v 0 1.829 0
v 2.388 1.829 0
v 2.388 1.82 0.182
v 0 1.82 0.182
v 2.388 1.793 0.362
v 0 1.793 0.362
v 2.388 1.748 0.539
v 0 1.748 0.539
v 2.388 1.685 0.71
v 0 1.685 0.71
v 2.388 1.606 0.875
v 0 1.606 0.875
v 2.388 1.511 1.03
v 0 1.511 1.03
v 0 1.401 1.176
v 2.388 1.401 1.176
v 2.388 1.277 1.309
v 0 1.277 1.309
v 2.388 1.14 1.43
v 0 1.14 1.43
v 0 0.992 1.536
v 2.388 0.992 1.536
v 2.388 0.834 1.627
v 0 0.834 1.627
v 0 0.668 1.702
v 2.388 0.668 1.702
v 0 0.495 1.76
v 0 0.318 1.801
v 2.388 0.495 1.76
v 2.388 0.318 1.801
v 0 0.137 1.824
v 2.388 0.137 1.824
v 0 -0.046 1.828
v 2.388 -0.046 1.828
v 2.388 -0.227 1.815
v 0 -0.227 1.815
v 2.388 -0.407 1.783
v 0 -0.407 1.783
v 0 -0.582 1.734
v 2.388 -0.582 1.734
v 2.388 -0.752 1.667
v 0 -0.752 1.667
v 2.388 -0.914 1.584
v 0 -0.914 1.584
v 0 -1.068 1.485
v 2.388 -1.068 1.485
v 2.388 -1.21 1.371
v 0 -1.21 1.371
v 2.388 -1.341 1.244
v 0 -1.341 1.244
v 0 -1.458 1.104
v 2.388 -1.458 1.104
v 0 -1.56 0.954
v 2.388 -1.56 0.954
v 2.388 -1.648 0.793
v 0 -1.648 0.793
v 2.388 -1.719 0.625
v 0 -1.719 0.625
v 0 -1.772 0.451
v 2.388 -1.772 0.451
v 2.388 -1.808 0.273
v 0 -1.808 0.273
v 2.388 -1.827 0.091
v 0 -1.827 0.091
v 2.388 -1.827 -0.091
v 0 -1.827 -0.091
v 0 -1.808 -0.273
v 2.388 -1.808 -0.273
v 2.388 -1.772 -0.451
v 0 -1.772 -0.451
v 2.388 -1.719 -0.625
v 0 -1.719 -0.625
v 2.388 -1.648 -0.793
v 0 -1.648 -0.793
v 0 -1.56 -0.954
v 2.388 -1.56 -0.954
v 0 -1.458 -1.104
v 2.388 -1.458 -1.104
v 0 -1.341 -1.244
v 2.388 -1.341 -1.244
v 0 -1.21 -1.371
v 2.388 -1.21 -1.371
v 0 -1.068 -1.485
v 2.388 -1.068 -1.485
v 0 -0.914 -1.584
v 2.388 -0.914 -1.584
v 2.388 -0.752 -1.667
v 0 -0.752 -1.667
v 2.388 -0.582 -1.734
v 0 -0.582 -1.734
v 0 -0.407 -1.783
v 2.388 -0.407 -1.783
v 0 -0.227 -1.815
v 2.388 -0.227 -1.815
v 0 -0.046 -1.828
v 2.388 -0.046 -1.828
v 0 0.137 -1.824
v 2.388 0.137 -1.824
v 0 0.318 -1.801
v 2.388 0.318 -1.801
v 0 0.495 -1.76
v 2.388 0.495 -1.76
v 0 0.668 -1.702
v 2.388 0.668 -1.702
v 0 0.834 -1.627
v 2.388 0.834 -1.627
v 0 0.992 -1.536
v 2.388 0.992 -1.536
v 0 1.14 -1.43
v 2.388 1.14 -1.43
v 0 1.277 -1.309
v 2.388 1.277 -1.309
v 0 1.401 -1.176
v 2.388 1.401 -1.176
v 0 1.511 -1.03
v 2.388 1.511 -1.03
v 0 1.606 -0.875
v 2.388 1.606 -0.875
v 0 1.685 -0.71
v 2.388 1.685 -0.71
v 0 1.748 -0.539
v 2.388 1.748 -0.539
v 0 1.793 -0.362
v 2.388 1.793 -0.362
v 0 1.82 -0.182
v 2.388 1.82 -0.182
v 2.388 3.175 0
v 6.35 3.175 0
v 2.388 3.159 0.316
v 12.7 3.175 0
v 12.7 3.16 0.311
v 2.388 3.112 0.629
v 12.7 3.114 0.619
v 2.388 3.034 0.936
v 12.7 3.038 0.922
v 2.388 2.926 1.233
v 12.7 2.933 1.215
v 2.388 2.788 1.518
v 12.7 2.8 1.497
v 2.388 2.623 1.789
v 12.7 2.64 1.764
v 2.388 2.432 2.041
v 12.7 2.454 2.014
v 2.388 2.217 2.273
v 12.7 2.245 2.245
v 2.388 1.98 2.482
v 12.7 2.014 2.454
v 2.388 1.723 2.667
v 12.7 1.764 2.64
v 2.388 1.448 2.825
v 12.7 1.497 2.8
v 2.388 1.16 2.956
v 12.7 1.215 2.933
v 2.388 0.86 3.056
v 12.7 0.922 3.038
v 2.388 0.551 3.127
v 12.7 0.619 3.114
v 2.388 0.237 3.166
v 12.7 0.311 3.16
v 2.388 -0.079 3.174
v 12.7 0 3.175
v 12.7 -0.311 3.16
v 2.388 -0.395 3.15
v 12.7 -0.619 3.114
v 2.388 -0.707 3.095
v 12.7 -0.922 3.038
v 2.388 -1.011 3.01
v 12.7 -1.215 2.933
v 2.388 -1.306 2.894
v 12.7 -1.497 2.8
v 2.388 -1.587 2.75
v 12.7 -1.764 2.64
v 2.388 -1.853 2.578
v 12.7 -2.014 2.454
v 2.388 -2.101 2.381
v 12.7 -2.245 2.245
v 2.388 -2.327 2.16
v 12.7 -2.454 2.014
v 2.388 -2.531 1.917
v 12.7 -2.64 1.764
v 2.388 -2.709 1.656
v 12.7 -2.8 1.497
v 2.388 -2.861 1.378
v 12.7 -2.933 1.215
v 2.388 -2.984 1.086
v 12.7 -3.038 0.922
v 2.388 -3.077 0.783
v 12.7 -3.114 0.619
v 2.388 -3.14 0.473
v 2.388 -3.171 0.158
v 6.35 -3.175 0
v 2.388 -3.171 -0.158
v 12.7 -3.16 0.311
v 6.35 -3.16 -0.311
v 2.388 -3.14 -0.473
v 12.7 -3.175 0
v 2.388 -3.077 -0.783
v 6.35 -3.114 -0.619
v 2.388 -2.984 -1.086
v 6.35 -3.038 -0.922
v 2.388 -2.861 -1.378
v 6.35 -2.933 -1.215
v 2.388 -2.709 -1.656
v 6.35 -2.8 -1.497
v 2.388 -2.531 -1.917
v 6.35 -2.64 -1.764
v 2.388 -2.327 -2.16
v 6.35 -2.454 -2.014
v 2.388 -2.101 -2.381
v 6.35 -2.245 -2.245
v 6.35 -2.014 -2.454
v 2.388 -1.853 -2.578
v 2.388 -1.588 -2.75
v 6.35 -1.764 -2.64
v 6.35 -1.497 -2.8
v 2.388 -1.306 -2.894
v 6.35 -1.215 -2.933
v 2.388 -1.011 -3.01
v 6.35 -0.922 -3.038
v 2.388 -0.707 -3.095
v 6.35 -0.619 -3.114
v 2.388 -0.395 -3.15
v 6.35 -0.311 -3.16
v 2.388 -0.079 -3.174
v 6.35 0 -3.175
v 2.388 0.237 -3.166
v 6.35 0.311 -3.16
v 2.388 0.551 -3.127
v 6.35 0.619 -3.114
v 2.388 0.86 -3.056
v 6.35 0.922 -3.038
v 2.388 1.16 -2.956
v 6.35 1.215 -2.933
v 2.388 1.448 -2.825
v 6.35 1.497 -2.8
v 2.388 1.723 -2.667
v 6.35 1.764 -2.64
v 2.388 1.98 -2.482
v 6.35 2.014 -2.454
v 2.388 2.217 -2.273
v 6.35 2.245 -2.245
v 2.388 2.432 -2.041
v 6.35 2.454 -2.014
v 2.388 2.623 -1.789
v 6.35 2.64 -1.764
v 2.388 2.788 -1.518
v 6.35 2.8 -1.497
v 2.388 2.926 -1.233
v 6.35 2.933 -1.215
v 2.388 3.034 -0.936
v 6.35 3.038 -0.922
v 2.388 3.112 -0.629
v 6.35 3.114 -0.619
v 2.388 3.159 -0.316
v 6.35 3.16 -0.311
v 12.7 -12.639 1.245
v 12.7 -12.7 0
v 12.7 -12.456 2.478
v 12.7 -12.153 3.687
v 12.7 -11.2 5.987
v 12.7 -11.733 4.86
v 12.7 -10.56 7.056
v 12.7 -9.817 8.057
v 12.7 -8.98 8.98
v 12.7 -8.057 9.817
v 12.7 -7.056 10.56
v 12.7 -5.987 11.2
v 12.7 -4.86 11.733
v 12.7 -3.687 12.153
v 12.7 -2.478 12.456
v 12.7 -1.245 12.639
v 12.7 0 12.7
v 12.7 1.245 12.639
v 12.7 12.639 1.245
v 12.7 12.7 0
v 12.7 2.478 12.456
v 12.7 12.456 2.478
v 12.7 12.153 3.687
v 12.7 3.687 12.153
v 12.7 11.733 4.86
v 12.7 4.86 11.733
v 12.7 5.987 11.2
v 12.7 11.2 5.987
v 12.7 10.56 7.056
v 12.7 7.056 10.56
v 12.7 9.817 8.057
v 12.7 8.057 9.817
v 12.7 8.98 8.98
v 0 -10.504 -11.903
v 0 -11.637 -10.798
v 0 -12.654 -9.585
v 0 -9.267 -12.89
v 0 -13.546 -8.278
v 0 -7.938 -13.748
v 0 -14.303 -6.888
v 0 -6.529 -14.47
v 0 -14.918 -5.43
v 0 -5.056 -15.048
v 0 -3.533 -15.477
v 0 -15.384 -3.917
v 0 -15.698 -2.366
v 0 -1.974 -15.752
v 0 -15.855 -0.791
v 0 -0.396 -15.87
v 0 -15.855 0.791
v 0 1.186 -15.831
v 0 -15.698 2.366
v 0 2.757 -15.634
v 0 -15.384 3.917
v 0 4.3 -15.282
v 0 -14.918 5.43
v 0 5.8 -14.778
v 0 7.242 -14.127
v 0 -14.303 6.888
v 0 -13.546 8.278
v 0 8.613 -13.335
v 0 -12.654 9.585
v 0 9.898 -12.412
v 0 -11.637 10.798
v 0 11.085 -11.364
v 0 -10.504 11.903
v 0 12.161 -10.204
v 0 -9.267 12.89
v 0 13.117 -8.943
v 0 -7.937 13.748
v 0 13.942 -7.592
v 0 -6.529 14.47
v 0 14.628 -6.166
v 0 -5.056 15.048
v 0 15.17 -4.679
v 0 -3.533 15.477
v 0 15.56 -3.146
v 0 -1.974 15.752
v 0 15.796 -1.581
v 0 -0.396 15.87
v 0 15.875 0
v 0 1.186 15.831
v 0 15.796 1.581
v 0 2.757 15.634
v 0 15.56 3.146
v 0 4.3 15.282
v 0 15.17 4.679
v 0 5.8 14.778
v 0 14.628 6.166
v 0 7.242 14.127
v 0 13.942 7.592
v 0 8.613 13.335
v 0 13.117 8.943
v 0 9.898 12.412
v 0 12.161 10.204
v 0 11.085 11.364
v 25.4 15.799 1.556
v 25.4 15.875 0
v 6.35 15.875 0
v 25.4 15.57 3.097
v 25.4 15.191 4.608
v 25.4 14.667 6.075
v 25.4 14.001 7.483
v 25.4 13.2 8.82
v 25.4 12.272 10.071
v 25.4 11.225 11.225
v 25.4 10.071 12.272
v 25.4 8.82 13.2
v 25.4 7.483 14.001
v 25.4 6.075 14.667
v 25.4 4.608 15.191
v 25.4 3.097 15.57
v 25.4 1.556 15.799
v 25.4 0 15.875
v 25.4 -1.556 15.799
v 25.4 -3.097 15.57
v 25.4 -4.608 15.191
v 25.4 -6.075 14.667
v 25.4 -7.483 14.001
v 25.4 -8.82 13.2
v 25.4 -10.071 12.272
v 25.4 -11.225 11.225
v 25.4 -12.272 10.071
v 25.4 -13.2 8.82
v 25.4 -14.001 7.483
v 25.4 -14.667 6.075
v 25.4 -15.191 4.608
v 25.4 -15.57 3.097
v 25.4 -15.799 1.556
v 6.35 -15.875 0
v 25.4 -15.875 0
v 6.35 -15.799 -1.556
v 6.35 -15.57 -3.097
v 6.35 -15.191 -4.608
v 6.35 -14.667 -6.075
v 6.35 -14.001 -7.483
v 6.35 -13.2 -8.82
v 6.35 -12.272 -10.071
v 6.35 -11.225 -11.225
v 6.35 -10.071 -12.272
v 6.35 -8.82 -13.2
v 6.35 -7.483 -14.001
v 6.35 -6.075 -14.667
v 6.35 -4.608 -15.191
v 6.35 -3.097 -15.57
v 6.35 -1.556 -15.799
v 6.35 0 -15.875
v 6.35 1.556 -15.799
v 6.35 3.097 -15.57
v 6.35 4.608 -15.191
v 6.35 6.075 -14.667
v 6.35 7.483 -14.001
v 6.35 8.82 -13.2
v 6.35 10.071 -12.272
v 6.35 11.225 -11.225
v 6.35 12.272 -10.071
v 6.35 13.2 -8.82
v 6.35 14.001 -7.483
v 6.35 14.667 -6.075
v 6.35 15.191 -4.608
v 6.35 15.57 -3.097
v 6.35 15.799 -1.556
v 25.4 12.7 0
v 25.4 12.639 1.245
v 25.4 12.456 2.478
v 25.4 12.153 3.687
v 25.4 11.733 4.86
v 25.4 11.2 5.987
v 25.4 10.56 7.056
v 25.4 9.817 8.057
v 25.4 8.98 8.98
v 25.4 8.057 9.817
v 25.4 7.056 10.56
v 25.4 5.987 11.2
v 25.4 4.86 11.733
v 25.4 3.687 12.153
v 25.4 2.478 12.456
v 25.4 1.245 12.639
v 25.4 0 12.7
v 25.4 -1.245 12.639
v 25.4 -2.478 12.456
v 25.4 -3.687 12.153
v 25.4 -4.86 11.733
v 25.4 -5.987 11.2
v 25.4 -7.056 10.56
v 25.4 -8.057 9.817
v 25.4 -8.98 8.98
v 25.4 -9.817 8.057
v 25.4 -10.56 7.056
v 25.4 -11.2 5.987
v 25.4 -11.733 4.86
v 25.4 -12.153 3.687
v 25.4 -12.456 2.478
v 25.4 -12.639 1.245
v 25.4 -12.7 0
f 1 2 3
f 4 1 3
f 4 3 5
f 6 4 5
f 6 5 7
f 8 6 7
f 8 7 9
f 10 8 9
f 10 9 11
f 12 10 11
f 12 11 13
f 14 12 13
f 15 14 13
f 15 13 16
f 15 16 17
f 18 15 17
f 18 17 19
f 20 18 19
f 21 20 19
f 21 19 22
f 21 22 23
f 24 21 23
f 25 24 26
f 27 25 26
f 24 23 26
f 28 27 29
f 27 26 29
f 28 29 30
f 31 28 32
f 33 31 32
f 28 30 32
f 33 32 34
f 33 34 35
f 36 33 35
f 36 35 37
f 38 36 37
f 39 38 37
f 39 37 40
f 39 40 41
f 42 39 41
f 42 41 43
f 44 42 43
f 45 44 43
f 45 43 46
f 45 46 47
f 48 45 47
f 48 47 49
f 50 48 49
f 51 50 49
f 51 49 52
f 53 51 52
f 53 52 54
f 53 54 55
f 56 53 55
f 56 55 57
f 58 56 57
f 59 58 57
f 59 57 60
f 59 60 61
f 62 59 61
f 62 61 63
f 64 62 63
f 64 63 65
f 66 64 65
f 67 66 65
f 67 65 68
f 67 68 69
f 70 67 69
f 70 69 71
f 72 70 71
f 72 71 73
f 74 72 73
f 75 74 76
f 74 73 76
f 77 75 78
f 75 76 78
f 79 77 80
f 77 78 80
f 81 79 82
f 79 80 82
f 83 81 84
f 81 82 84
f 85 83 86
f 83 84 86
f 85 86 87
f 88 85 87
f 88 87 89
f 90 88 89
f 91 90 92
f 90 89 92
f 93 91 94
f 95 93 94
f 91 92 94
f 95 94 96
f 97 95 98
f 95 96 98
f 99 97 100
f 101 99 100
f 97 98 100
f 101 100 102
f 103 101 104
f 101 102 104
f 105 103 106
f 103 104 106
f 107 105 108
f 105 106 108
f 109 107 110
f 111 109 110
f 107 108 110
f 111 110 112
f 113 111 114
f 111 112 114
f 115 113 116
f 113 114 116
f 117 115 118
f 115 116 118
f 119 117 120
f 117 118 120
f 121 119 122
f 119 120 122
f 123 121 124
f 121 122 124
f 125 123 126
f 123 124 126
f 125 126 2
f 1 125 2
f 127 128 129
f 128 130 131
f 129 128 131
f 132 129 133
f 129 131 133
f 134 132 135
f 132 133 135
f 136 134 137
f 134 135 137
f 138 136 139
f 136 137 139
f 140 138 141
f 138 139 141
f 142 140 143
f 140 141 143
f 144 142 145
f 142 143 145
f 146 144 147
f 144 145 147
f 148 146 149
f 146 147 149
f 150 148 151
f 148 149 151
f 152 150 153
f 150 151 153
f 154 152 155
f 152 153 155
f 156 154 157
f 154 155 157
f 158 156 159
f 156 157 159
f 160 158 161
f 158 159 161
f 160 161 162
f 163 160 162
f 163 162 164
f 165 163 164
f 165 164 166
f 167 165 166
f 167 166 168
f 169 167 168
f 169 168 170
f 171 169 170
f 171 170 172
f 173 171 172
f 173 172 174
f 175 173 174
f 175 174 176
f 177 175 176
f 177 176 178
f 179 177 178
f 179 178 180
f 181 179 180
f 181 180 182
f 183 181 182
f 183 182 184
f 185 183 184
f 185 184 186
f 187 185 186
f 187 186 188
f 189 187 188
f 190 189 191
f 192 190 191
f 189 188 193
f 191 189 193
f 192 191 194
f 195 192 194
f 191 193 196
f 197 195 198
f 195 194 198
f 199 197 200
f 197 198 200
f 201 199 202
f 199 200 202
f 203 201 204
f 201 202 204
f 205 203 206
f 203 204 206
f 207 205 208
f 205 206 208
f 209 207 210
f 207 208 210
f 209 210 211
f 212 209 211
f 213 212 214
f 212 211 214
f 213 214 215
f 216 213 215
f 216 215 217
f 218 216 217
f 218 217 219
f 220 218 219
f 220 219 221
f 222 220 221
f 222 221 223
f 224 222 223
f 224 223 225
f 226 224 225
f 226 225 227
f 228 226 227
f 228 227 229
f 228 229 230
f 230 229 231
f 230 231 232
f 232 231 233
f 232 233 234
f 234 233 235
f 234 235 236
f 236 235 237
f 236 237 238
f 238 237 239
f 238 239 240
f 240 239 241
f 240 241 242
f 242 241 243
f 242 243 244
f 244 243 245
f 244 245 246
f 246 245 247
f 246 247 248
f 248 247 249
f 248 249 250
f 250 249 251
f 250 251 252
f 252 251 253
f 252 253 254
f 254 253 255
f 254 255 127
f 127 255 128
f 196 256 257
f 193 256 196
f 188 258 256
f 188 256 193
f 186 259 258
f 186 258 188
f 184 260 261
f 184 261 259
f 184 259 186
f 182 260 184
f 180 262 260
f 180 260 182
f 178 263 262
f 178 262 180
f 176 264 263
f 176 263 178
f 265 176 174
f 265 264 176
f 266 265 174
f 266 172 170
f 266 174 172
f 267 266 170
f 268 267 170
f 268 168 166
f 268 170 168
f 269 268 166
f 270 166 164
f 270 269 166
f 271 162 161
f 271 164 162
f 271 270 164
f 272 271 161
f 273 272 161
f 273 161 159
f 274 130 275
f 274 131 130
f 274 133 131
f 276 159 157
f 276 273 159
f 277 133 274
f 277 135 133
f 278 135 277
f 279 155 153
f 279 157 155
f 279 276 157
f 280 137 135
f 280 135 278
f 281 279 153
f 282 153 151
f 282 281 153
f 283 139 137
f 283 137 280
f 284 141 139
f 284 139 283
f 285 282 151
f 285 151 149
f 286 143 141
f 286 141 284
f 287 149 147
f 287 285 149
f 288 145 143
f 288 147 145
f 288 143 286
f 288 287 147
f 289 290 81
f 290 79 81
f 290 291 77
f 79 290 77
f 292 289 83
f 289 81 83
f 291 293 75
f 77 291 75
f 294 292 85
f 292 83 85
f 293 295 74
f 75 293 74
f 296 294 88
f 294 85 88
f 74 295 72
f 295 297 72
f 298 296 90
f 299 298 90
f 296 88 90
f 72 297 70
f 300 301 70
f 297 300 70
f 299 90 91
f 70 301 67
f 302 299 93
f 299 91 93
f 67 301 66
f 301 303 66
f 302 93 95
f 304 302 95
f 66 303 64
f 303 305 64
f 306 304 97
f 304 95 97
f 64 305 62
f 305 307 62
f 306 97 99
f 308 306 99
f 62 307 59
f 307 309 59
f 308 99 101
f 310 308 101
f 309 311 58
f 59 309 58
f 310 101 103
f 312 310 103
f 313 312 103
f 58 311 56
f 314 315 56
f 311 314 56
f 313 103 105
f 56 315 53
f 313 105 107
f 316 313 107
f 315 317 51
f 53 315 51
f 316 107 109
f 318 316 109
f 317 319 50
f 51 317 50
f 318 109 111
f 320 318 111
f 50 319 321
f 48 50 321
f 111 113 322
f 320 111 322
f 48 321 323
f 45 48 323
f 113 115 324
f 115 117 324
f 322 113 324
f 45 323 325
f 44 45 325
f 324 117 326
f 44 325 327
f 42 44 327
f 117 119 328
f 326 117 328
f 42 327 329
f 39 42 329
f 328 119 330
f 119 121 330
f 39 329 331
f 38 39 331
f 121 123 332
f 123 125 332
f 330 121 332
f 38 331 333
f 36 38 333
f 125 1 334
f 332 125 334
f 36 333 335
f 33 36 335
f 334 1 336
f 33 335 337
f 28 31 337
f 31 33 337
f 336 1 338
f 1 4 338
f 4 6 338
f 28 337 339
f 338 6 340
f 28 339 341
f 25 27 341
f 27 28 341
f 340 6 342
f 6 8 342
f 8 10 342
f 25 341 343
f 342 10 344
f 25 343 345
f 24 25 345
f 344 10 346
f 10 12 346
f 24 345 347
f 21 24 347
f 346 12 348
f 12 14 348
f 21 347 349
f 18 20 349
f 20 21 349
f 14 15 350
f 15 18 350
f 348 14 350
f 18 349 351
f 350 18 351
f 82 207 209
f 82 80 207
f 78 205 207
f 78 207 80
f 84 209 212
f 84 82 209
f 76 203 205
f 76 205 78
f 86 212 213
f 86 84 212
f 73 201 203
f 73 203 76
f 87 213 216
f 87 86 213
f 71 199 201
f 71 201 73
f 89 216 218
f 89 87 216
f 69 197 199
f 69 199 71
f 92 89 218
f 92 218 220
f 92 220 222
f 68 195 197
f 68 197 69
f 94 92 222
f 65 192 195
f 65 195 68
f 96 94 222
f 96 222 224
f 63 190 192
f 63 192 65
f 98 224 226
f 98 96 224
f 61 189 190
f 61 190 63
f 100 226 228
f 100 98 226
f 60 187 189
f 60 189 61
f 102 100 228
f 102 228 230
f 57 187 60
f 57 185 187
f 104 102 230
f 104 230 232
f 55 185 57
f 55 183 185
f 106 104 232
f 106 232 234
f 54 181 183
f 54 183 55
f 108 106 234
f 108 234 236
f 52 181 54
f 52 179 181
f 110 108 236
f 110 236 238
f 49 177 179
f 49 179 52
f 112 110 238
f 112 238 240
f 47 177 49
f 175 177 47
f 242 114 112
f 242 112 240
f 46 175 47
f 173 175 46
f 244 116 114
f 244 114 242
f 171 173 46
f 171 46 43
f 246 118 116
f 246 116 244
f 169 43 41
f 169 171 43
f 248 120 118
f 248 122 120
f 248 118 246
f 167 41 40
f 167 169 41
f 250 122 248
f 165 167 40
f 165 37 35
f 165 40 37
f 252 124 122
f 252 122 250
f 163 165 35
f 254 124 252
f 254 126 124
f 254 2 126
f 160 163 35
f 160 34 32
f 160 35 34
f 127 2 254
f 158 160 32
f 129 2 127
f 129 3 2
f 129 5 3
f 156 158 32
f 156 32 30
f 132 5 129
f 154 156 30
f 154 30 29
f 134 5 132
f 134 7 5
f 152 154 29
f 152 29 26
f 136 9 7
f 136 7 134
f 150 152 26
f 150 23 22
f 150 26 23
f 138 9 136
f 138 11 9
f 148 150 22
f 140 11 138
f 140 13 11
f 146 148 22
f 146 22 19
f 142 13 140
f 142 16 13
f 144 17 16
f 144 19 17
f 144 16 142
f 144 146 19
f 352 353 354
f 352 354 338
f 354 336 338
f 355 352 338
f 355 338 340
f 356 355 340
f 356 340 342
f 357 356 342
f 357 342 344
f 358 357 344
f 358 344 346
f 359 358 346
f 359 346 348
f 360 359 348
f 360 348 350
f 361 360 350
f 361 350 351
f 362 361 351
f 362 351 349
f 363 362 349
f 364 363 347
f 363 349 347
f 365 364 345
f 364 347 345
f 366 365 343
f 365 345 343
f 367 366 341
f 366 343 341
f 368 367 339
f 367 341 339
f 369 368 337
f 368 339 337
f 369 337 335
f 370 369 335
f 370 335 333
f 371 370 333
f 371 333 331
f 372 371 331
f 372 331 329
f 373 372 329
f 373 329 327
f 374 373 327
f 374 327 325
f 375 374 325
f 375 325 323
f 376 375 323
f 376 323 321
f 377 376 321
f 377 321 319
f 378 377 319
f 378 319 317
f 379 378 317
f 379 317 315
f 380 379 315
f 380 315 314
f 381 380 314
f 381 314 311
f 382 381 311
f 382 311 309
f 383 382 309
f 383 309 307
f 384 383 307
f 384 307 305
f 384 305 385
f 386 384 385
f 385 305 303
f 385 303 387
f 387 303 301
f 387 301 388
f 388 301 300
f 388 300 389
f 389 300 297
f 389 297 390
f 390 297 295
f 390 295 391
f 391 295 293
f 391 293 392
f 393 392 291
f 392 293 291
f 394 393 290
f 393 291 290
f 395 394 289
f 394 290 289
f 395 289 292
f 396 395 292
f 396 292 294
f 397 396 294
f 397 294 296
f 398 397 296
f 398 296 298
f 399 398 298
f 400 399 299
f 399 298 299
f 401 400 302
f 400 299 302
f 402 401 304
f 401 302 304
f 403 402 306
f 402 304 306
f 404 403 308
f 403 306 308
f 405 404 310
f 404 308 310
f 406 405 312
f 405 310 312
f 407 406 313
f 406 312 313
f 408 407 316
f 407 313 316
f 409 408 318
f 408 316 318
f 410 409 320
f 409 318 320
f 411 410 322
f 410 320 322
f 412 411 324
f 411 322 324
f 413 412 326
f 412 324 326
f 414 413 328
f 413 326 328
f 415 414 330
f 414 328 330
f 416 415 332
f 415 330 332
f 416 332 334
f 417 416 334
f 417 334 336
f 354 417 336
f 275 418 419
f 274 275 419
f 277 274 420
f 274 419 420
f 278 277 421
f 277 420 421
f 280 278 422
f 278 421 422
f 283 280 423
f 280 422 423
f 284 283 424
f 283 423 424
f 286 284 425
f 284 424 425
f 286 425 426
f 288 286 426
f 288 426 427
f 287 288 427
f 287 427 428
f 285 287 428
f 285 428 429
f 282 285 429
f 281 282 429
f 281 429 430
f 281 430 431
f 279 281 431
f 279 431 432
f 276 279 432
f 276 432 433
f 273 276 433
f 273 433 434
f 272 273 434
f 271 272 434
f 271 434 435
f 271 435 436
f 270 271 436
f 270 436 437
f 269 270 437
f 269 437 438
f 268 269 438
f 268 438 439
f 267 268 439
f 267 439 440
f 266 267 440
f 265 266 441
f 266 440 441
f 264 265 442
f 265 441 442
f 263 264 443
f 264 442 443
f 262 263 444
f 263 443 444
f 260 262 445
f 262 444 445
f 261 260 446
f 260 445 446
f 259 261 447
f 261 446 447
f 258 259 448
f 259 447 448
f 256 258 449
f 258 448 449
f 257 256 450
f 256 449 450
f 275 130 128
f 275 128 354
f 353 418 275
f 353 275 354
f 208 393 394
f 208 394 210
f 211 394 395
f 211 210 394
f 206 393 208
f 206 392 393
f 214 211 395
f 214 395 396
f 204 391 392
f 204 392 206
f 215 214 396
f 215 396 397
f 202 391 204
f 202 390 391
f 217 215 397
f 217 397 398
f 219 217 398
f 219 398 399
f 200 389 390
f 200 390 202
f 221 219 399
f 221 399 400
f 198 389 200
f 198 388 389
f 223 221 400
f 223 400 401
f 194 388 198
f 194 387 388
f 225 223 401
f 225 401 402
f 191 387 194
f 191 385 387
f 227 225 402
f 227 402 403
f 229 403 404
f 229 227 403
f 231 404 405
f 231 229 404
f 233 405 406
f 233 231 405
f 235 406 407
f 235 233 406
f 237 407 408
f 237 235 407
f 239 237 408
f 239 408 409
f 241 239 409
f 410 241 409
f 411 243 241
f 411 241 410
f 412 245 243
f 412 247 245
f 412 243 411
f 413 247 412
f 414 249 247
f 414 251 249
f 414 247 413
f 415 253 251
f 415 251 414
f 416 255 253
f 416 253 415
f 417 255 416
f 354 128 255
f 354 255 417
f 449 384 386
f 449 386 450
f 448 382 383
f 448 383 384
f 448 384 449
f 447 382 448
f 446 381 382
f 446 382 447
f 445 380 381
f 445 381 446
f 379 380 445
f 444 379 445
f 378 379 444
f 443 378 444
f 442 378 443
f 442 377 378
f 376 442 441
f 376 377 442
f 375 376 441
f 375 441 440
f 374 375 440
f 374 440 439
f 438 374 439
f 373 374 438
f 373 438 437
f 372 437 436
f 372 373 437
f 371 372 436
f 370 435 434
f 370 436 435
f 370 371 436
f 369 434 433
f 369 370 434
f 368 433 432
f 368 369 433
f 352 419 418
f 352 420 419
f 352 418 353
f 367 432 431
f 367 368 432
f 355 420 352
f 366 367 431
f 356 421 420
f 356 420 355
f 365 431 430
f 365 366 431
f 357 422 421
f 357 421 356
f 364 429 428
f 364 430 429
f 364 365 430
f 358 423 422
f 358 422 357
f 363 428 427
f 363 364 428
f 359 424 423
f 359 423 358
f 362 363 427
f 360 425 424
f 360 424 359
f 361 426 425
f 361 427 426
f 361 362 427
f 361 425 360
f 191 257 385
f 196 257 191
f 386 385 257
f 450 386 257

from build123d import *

# Parameters (mm, degrees)
F0_R     = 15.875
F1_DEPTH = 25.4
F2_W     = 43.094914
F2_H     = 19.034712
F3_DEPTH = 19.05
F4_R     = 1.8288
F5_DEPTH = 6.351
F6_R     = 12.7
F7_DEPTH = 12.7
F8_R     = 3.175
F9_DEPTH = 23.0124


with BuildPart() as f1:
    # F0 (on Right) → F1 (new body)
    with BuildSketch(Plane.YZ):
        Circle(F0_R)
    extrude(amount=F1_DEPTH)

    # F2 (on face) → F3 (cut)
    with BuildSketch(Plane.YZ.offset(25.4)):
        with Locations((0.400271, -9.517356)):
            Rectangle(F2_W, F2_H)
    extrude(amount=-F3_DEPTH, mode=Mode.SUBTRACT)

    # F4 (on face) → F5 (cut, through all)
    with BuildSketch(Plane.YZ.offset(6.35)):
        Circle(F4_R)
    extrude(amount=-F5_DEPTH, mode=Mode.SUBTRACT)

    # F6 (on face) → F7 (cut)
    with BuildSketch(Plane.YZ.offset(25.4)):
        Circle(F6_R)
    extrude(amount=-F7_DEPTH, mode=Mode.SUBTRACT)

    # F8 (on face) → F9 (cut)
    with BuildSketch(Plane.YZ.offset(25.4)):
        Circle(F8_R)
    extrude(amount=-F9_DEPTH, mode=Mode.SUBTRACT)


solid = f1.part
